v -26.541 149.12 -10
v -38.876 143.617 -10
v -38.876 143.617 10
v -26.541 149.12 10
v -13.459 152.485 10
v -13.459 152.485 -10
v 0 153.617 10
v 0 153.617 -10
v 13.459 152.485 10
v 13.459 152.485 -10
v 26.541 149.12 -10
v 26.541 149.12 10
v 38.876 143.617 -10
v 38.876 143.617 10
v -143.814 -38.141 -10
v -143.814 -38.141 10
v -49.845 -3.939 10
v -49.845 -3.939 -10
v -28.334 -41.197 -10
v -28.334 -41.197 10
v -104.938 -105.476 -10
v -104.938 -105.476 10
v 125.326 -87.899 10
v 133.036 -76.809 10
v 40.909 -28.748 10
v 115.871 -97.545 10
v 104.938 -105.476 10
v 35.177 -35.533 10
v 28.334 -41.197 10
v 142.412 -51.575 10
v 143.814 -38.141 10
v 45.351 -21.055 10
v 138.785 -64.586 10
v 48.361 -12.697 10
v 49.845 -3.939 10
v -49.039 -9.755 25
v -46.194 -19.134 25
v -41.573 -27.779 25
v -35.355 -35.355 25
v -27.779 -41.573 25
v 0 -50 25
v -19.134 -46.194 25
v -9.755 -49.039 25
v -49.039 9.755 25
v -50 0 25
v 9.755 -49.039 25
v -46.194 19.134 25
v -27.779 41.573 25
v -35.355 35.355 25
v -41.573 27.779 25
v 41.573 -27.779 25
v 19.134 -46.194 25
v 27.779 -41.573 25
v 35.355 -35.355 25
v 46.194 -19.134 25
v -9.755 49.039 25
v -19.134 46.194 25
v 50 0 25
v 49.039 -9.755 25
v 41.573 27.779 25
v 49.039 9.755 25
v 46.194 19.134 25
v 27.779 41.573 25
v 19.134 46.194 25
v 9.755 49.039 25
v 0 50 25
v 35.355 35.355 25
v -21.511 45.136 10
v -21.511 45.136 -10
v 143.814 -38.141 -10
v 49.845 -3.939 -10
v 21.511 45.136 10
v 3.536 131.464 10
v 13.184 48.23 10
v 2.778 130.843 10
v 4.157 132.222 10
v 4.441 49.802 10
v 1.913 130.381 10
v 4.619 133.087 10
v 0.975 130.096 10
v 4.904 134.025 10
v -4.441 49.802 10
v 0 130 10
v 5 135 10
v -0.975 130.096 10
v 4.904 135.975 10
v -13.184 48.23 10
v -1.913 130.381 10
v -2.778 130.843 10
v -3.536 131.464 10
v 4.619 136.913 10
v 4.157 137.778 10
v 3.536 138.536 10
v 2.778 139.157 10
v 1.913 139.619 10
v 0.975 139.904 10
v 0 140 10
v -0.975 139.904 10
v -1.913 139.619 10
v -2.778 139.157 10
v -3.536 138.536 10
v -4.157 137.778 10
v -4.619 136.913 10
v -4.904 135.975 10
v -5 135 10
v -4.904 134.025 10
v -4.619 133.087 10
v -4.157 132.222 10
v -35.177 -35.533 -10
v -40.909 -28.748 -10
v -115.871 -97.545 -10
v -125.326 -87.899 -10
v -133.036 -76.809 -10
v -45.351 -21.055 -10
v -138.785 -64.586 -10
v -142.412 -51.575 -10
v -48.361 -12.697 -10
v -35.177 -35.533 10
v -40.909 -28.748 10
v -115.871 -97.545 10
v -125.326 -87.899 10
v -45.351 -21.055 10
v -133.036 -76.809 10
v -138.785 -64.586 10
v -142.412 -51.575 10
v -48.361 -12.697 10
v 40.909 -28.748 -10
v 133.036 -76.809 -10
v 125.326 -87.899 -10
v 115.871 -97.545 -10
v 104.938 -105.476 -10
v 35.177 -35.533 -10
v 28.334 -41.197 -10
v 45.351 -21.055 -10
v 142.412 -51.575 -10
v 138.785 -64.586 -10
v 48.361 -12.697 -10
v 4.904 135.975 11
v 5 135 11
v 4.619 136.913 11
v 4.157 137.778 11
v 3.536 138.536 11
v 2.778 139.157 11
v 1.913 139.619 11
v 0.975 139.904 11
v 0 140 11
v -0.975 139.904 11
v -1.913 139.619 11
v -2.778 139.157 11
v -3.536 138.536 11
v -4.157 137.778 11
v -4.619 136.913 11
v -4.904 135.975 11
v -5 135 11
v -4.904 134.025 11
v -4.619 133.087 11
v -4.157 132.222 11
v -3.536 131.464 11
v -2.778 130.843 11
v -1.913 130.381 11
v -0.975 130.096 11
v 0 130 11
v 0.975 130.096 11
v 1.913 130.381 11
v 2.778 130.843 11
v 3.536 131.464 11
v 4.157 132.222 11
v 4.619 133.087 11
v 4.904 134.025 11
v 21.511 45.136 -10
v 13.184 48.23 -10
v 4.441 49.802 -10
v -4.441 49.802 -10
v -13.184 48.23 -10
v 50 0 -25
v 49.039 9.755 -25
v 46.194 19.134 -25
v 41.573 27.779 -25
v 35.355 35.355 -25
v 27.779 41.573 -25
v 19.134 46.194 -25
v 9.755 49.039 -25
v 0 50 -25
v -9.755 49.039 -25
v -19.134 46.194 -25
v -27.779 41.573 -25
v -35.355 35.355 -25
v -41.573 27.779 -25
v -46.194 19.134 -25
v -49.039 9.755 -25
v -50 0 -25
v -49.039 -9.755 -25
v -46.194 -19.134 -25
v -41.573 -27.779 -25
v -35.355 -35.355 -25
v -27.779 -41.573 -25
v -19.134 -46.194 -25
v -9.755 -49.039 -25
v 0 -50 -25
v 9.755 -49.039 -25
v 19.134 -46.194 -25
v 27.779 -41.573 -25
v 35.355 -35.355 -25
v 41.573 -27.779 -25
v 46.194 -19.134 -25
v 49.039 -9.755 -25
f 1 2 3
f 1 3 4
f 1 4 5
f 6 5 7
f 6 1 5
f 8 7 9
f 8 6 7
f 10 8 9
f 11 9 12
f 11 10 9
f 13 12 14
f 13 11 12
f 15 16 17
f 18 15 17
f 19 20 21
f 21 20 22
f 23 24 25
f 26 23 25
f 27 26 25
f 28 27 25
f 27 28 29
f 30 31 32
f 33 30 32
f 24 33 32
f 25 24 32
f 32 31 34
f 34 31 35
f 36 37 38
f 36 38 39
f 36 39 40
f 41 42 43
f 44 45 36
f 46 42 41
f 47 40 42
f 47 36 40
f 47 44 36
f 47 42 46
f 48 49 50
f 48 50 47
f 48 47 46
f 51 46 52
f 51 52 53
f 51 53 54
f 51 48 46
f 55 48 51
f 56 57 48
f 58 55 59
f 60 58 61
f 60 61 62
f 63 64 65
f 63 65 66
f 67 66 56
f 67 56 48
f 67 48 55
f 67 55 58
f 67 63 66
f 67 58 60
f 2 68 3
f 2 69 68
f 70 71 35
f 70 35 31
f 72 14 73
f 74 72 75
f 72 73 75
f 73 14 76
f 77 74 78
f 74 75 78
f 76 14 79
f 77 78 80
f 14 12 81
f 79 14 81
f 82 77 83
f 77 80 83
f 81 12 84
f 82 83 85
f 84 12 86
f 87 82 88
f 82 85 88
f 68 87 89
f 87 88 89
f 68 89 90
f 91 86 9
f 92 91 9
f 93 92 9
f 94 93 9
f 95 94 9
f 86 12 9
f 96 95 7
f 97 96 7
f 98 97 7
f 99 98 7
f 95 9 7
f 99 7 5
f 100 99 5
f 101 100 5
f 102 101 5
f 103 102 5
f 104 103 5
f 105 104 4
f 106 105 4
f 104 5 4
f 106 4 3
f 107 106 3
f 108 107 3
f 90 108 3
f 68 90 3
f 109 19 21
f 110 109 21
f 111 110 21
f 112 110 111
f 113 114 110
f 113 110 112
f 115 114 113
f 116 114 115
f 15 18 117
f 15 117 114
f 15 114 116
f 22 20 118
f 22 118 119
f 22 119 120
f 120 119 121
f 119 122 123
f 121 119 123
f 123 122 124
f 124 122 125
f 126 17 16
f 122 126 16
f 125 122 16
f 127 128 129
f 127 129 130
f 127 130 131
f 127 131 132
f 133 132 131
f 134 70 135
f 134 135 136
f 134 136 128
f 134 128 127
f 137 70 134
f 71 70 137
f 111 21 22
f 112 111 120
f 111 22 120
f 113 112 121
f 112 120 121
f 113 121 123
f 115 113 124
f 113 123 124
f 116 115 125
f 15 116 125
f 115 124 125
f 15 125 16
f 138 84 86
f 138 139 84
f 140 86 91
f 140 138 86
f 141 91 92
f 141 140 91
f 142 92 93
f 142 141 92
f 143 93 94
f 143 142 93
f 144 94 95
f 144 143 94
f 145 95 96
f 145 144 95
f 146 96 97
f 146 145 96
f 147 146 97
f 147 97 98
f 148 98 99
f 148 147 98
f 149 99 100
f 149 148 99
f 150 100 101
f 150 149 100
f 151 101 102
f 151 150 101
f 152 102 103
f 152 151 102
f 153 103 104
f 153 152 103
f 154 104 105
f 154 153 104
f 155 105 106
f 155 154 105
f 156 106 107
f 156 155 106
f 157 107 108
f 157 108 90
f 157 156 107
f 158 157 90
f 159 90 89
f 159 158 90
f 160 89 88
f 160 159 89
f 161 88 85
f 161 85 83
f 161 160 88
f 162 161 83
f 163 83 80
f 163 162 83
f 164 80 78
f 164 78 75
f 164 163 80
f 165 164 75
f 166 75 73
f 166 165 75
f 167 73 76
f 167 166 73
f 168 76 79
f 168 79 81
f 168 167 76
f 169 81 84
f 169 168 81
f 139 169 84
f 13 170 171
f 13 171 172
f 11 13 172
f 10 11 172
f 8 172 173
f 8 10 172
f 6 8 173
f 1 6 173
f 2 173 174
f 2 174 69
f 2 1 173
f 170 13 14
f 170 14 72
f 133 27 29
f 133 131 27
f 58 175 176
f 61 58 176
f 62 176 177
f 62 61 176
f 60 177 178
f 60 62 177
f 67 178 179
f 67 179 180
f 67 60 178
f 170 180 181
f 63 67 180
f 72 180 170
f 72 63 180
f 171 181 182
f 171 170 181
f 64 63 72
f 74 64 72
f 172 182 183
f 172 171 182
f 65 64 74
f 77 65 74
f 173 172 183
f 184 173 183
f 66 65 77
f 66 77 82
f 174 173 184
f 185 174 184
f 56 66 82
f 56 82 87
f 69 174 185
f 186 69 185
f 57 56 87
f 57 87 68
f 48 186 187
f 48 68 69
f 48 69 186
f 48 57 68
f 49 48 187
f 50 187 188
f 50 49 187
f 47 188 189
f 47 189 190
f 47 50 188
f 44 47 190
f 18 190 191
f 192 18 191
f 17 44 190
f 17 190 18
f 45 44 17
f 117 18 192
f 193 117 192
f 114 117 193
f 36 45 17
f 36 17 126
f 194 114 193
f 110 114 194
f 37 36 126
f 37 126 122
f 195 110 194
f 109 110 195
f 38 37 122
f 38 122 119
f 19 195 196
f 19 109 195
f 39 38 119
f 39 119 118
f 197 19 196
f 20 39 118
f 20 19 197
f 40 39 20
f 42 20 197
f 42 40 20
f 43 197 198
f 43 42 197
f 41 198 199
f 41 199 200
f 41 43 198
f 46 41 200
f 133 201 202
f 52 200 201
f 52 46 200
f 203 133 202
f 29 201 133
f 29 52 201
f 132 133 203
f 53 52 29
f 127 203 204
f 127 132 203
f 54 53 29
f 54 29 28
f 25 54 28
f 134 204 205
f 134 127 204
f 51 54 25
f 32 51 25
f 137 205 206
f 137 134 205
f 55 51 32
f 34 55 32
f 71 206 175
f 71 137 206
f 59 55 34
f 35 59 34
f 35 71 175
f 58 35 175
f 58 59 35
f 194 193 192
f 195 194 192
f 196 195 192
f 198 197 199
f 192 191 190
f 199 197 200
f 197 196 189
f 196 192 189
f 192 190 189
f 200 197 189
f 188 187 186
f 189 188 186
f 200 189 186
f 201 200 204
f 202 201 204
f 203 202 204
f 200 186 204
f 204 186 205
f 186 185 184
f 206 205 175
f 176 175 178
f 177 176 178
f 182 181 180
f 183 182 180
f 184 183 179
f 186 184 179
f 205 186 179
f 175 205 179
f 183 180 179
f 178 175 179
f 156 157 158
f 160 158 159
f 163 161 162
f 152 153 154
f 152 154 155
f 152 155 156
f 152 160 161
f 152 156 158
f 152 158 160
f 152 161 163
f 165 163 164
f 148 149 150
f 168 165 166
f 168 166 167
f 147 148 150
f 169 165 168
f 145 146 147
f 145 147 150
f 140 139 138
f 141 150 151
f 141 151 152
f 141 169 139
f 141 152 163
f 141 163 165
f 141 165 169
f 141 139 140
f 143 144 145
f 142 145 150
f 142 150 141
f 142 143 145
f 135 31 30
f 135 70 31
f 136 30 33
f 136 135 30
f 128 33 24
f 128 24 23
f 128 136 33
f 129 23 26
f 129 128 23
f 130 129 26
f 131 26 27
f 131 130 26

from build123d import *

# Parameters (mm, degrees)
SKETCH1_R           = 50
BOSS_EXTRUDE1_DEPTH = 25
BOSS_EXTRUDE2_DEPTH = 10
SKETCH3_R           = 5
BOSS_EXTRUDE3_DEPTH = 1


with BuildPart() as part:
    # Sketch1 → Boss-Extrude1 (new body, symmetric)
    with BuildSketch(Plane.XY):
        Circle(SKETCH1_R)
    extrude(amount=BOSS_EXTRUDE1_DEPTH, both=True)

    # Sketch2 → Boss-Extrude2 (add, symmetric)
    with BuildSketch(Plane.XY):
        with BuildLine():
            Line((-21.510823847, 45.13628759), (-38.875641614, 143.617062891))
            ThreePointArc((-38.875641614, 143.617062891), (0, 153.617062891), (38.875641614, 143.617062891))
            Line((38.875641614, 143.617062891), (21.510823847, 45.13628759))
            ThreePointArc((21.510823847, 45.13628759), (0, 50), (-21.510823847, 45.13628759))
        make_face()
        with BuildLine():
            Line((104.938204074, -105.475824672), (28.333759762, -41.197063703))
            ThreePointArc((28.333759762, -41.197063703), (43.301270189, -25), (49.844583609, -3.939223887))
            Line((49.844583609, -3.939223887), (143.813845688, -38.14123822))
            ThreePointArc((143.813845688, -38.14123822), (133.036278919, -76.808531446), (104.938204074, -105.475824672))
        make_face()
        with BuildLine():
            Line((-143.813845688, -38.14123822), (-49.844583609, -3.939223887))
            ThreePointArc((-49.844583609, -3.939223887), (-43.301270189, -25), (-28.333759762, -41.197063703))
            Line((-28.333759762, -41.197063703), (-104.938204074, -105.475824672))
            ThreePointArc((-104.938204074, -105.475824672), (-133.036278919, -76.808531446), (-143.813845688, -38.14123822))
        make_face()
    extrude(amount=BOSS_EXTRUDE2_DEPTH, both=True)

    # Sketch3 → Boss-Extrude3 (add, symmetric)
    with BuildSketch(Plane.XY.offset(10)):
        with Locations((0, 135)):
            Circle(SKETCH3_R)
    extrude(amount=BOSS_EXTRUDE3_DEPTH, both=True)


solid = part.part
